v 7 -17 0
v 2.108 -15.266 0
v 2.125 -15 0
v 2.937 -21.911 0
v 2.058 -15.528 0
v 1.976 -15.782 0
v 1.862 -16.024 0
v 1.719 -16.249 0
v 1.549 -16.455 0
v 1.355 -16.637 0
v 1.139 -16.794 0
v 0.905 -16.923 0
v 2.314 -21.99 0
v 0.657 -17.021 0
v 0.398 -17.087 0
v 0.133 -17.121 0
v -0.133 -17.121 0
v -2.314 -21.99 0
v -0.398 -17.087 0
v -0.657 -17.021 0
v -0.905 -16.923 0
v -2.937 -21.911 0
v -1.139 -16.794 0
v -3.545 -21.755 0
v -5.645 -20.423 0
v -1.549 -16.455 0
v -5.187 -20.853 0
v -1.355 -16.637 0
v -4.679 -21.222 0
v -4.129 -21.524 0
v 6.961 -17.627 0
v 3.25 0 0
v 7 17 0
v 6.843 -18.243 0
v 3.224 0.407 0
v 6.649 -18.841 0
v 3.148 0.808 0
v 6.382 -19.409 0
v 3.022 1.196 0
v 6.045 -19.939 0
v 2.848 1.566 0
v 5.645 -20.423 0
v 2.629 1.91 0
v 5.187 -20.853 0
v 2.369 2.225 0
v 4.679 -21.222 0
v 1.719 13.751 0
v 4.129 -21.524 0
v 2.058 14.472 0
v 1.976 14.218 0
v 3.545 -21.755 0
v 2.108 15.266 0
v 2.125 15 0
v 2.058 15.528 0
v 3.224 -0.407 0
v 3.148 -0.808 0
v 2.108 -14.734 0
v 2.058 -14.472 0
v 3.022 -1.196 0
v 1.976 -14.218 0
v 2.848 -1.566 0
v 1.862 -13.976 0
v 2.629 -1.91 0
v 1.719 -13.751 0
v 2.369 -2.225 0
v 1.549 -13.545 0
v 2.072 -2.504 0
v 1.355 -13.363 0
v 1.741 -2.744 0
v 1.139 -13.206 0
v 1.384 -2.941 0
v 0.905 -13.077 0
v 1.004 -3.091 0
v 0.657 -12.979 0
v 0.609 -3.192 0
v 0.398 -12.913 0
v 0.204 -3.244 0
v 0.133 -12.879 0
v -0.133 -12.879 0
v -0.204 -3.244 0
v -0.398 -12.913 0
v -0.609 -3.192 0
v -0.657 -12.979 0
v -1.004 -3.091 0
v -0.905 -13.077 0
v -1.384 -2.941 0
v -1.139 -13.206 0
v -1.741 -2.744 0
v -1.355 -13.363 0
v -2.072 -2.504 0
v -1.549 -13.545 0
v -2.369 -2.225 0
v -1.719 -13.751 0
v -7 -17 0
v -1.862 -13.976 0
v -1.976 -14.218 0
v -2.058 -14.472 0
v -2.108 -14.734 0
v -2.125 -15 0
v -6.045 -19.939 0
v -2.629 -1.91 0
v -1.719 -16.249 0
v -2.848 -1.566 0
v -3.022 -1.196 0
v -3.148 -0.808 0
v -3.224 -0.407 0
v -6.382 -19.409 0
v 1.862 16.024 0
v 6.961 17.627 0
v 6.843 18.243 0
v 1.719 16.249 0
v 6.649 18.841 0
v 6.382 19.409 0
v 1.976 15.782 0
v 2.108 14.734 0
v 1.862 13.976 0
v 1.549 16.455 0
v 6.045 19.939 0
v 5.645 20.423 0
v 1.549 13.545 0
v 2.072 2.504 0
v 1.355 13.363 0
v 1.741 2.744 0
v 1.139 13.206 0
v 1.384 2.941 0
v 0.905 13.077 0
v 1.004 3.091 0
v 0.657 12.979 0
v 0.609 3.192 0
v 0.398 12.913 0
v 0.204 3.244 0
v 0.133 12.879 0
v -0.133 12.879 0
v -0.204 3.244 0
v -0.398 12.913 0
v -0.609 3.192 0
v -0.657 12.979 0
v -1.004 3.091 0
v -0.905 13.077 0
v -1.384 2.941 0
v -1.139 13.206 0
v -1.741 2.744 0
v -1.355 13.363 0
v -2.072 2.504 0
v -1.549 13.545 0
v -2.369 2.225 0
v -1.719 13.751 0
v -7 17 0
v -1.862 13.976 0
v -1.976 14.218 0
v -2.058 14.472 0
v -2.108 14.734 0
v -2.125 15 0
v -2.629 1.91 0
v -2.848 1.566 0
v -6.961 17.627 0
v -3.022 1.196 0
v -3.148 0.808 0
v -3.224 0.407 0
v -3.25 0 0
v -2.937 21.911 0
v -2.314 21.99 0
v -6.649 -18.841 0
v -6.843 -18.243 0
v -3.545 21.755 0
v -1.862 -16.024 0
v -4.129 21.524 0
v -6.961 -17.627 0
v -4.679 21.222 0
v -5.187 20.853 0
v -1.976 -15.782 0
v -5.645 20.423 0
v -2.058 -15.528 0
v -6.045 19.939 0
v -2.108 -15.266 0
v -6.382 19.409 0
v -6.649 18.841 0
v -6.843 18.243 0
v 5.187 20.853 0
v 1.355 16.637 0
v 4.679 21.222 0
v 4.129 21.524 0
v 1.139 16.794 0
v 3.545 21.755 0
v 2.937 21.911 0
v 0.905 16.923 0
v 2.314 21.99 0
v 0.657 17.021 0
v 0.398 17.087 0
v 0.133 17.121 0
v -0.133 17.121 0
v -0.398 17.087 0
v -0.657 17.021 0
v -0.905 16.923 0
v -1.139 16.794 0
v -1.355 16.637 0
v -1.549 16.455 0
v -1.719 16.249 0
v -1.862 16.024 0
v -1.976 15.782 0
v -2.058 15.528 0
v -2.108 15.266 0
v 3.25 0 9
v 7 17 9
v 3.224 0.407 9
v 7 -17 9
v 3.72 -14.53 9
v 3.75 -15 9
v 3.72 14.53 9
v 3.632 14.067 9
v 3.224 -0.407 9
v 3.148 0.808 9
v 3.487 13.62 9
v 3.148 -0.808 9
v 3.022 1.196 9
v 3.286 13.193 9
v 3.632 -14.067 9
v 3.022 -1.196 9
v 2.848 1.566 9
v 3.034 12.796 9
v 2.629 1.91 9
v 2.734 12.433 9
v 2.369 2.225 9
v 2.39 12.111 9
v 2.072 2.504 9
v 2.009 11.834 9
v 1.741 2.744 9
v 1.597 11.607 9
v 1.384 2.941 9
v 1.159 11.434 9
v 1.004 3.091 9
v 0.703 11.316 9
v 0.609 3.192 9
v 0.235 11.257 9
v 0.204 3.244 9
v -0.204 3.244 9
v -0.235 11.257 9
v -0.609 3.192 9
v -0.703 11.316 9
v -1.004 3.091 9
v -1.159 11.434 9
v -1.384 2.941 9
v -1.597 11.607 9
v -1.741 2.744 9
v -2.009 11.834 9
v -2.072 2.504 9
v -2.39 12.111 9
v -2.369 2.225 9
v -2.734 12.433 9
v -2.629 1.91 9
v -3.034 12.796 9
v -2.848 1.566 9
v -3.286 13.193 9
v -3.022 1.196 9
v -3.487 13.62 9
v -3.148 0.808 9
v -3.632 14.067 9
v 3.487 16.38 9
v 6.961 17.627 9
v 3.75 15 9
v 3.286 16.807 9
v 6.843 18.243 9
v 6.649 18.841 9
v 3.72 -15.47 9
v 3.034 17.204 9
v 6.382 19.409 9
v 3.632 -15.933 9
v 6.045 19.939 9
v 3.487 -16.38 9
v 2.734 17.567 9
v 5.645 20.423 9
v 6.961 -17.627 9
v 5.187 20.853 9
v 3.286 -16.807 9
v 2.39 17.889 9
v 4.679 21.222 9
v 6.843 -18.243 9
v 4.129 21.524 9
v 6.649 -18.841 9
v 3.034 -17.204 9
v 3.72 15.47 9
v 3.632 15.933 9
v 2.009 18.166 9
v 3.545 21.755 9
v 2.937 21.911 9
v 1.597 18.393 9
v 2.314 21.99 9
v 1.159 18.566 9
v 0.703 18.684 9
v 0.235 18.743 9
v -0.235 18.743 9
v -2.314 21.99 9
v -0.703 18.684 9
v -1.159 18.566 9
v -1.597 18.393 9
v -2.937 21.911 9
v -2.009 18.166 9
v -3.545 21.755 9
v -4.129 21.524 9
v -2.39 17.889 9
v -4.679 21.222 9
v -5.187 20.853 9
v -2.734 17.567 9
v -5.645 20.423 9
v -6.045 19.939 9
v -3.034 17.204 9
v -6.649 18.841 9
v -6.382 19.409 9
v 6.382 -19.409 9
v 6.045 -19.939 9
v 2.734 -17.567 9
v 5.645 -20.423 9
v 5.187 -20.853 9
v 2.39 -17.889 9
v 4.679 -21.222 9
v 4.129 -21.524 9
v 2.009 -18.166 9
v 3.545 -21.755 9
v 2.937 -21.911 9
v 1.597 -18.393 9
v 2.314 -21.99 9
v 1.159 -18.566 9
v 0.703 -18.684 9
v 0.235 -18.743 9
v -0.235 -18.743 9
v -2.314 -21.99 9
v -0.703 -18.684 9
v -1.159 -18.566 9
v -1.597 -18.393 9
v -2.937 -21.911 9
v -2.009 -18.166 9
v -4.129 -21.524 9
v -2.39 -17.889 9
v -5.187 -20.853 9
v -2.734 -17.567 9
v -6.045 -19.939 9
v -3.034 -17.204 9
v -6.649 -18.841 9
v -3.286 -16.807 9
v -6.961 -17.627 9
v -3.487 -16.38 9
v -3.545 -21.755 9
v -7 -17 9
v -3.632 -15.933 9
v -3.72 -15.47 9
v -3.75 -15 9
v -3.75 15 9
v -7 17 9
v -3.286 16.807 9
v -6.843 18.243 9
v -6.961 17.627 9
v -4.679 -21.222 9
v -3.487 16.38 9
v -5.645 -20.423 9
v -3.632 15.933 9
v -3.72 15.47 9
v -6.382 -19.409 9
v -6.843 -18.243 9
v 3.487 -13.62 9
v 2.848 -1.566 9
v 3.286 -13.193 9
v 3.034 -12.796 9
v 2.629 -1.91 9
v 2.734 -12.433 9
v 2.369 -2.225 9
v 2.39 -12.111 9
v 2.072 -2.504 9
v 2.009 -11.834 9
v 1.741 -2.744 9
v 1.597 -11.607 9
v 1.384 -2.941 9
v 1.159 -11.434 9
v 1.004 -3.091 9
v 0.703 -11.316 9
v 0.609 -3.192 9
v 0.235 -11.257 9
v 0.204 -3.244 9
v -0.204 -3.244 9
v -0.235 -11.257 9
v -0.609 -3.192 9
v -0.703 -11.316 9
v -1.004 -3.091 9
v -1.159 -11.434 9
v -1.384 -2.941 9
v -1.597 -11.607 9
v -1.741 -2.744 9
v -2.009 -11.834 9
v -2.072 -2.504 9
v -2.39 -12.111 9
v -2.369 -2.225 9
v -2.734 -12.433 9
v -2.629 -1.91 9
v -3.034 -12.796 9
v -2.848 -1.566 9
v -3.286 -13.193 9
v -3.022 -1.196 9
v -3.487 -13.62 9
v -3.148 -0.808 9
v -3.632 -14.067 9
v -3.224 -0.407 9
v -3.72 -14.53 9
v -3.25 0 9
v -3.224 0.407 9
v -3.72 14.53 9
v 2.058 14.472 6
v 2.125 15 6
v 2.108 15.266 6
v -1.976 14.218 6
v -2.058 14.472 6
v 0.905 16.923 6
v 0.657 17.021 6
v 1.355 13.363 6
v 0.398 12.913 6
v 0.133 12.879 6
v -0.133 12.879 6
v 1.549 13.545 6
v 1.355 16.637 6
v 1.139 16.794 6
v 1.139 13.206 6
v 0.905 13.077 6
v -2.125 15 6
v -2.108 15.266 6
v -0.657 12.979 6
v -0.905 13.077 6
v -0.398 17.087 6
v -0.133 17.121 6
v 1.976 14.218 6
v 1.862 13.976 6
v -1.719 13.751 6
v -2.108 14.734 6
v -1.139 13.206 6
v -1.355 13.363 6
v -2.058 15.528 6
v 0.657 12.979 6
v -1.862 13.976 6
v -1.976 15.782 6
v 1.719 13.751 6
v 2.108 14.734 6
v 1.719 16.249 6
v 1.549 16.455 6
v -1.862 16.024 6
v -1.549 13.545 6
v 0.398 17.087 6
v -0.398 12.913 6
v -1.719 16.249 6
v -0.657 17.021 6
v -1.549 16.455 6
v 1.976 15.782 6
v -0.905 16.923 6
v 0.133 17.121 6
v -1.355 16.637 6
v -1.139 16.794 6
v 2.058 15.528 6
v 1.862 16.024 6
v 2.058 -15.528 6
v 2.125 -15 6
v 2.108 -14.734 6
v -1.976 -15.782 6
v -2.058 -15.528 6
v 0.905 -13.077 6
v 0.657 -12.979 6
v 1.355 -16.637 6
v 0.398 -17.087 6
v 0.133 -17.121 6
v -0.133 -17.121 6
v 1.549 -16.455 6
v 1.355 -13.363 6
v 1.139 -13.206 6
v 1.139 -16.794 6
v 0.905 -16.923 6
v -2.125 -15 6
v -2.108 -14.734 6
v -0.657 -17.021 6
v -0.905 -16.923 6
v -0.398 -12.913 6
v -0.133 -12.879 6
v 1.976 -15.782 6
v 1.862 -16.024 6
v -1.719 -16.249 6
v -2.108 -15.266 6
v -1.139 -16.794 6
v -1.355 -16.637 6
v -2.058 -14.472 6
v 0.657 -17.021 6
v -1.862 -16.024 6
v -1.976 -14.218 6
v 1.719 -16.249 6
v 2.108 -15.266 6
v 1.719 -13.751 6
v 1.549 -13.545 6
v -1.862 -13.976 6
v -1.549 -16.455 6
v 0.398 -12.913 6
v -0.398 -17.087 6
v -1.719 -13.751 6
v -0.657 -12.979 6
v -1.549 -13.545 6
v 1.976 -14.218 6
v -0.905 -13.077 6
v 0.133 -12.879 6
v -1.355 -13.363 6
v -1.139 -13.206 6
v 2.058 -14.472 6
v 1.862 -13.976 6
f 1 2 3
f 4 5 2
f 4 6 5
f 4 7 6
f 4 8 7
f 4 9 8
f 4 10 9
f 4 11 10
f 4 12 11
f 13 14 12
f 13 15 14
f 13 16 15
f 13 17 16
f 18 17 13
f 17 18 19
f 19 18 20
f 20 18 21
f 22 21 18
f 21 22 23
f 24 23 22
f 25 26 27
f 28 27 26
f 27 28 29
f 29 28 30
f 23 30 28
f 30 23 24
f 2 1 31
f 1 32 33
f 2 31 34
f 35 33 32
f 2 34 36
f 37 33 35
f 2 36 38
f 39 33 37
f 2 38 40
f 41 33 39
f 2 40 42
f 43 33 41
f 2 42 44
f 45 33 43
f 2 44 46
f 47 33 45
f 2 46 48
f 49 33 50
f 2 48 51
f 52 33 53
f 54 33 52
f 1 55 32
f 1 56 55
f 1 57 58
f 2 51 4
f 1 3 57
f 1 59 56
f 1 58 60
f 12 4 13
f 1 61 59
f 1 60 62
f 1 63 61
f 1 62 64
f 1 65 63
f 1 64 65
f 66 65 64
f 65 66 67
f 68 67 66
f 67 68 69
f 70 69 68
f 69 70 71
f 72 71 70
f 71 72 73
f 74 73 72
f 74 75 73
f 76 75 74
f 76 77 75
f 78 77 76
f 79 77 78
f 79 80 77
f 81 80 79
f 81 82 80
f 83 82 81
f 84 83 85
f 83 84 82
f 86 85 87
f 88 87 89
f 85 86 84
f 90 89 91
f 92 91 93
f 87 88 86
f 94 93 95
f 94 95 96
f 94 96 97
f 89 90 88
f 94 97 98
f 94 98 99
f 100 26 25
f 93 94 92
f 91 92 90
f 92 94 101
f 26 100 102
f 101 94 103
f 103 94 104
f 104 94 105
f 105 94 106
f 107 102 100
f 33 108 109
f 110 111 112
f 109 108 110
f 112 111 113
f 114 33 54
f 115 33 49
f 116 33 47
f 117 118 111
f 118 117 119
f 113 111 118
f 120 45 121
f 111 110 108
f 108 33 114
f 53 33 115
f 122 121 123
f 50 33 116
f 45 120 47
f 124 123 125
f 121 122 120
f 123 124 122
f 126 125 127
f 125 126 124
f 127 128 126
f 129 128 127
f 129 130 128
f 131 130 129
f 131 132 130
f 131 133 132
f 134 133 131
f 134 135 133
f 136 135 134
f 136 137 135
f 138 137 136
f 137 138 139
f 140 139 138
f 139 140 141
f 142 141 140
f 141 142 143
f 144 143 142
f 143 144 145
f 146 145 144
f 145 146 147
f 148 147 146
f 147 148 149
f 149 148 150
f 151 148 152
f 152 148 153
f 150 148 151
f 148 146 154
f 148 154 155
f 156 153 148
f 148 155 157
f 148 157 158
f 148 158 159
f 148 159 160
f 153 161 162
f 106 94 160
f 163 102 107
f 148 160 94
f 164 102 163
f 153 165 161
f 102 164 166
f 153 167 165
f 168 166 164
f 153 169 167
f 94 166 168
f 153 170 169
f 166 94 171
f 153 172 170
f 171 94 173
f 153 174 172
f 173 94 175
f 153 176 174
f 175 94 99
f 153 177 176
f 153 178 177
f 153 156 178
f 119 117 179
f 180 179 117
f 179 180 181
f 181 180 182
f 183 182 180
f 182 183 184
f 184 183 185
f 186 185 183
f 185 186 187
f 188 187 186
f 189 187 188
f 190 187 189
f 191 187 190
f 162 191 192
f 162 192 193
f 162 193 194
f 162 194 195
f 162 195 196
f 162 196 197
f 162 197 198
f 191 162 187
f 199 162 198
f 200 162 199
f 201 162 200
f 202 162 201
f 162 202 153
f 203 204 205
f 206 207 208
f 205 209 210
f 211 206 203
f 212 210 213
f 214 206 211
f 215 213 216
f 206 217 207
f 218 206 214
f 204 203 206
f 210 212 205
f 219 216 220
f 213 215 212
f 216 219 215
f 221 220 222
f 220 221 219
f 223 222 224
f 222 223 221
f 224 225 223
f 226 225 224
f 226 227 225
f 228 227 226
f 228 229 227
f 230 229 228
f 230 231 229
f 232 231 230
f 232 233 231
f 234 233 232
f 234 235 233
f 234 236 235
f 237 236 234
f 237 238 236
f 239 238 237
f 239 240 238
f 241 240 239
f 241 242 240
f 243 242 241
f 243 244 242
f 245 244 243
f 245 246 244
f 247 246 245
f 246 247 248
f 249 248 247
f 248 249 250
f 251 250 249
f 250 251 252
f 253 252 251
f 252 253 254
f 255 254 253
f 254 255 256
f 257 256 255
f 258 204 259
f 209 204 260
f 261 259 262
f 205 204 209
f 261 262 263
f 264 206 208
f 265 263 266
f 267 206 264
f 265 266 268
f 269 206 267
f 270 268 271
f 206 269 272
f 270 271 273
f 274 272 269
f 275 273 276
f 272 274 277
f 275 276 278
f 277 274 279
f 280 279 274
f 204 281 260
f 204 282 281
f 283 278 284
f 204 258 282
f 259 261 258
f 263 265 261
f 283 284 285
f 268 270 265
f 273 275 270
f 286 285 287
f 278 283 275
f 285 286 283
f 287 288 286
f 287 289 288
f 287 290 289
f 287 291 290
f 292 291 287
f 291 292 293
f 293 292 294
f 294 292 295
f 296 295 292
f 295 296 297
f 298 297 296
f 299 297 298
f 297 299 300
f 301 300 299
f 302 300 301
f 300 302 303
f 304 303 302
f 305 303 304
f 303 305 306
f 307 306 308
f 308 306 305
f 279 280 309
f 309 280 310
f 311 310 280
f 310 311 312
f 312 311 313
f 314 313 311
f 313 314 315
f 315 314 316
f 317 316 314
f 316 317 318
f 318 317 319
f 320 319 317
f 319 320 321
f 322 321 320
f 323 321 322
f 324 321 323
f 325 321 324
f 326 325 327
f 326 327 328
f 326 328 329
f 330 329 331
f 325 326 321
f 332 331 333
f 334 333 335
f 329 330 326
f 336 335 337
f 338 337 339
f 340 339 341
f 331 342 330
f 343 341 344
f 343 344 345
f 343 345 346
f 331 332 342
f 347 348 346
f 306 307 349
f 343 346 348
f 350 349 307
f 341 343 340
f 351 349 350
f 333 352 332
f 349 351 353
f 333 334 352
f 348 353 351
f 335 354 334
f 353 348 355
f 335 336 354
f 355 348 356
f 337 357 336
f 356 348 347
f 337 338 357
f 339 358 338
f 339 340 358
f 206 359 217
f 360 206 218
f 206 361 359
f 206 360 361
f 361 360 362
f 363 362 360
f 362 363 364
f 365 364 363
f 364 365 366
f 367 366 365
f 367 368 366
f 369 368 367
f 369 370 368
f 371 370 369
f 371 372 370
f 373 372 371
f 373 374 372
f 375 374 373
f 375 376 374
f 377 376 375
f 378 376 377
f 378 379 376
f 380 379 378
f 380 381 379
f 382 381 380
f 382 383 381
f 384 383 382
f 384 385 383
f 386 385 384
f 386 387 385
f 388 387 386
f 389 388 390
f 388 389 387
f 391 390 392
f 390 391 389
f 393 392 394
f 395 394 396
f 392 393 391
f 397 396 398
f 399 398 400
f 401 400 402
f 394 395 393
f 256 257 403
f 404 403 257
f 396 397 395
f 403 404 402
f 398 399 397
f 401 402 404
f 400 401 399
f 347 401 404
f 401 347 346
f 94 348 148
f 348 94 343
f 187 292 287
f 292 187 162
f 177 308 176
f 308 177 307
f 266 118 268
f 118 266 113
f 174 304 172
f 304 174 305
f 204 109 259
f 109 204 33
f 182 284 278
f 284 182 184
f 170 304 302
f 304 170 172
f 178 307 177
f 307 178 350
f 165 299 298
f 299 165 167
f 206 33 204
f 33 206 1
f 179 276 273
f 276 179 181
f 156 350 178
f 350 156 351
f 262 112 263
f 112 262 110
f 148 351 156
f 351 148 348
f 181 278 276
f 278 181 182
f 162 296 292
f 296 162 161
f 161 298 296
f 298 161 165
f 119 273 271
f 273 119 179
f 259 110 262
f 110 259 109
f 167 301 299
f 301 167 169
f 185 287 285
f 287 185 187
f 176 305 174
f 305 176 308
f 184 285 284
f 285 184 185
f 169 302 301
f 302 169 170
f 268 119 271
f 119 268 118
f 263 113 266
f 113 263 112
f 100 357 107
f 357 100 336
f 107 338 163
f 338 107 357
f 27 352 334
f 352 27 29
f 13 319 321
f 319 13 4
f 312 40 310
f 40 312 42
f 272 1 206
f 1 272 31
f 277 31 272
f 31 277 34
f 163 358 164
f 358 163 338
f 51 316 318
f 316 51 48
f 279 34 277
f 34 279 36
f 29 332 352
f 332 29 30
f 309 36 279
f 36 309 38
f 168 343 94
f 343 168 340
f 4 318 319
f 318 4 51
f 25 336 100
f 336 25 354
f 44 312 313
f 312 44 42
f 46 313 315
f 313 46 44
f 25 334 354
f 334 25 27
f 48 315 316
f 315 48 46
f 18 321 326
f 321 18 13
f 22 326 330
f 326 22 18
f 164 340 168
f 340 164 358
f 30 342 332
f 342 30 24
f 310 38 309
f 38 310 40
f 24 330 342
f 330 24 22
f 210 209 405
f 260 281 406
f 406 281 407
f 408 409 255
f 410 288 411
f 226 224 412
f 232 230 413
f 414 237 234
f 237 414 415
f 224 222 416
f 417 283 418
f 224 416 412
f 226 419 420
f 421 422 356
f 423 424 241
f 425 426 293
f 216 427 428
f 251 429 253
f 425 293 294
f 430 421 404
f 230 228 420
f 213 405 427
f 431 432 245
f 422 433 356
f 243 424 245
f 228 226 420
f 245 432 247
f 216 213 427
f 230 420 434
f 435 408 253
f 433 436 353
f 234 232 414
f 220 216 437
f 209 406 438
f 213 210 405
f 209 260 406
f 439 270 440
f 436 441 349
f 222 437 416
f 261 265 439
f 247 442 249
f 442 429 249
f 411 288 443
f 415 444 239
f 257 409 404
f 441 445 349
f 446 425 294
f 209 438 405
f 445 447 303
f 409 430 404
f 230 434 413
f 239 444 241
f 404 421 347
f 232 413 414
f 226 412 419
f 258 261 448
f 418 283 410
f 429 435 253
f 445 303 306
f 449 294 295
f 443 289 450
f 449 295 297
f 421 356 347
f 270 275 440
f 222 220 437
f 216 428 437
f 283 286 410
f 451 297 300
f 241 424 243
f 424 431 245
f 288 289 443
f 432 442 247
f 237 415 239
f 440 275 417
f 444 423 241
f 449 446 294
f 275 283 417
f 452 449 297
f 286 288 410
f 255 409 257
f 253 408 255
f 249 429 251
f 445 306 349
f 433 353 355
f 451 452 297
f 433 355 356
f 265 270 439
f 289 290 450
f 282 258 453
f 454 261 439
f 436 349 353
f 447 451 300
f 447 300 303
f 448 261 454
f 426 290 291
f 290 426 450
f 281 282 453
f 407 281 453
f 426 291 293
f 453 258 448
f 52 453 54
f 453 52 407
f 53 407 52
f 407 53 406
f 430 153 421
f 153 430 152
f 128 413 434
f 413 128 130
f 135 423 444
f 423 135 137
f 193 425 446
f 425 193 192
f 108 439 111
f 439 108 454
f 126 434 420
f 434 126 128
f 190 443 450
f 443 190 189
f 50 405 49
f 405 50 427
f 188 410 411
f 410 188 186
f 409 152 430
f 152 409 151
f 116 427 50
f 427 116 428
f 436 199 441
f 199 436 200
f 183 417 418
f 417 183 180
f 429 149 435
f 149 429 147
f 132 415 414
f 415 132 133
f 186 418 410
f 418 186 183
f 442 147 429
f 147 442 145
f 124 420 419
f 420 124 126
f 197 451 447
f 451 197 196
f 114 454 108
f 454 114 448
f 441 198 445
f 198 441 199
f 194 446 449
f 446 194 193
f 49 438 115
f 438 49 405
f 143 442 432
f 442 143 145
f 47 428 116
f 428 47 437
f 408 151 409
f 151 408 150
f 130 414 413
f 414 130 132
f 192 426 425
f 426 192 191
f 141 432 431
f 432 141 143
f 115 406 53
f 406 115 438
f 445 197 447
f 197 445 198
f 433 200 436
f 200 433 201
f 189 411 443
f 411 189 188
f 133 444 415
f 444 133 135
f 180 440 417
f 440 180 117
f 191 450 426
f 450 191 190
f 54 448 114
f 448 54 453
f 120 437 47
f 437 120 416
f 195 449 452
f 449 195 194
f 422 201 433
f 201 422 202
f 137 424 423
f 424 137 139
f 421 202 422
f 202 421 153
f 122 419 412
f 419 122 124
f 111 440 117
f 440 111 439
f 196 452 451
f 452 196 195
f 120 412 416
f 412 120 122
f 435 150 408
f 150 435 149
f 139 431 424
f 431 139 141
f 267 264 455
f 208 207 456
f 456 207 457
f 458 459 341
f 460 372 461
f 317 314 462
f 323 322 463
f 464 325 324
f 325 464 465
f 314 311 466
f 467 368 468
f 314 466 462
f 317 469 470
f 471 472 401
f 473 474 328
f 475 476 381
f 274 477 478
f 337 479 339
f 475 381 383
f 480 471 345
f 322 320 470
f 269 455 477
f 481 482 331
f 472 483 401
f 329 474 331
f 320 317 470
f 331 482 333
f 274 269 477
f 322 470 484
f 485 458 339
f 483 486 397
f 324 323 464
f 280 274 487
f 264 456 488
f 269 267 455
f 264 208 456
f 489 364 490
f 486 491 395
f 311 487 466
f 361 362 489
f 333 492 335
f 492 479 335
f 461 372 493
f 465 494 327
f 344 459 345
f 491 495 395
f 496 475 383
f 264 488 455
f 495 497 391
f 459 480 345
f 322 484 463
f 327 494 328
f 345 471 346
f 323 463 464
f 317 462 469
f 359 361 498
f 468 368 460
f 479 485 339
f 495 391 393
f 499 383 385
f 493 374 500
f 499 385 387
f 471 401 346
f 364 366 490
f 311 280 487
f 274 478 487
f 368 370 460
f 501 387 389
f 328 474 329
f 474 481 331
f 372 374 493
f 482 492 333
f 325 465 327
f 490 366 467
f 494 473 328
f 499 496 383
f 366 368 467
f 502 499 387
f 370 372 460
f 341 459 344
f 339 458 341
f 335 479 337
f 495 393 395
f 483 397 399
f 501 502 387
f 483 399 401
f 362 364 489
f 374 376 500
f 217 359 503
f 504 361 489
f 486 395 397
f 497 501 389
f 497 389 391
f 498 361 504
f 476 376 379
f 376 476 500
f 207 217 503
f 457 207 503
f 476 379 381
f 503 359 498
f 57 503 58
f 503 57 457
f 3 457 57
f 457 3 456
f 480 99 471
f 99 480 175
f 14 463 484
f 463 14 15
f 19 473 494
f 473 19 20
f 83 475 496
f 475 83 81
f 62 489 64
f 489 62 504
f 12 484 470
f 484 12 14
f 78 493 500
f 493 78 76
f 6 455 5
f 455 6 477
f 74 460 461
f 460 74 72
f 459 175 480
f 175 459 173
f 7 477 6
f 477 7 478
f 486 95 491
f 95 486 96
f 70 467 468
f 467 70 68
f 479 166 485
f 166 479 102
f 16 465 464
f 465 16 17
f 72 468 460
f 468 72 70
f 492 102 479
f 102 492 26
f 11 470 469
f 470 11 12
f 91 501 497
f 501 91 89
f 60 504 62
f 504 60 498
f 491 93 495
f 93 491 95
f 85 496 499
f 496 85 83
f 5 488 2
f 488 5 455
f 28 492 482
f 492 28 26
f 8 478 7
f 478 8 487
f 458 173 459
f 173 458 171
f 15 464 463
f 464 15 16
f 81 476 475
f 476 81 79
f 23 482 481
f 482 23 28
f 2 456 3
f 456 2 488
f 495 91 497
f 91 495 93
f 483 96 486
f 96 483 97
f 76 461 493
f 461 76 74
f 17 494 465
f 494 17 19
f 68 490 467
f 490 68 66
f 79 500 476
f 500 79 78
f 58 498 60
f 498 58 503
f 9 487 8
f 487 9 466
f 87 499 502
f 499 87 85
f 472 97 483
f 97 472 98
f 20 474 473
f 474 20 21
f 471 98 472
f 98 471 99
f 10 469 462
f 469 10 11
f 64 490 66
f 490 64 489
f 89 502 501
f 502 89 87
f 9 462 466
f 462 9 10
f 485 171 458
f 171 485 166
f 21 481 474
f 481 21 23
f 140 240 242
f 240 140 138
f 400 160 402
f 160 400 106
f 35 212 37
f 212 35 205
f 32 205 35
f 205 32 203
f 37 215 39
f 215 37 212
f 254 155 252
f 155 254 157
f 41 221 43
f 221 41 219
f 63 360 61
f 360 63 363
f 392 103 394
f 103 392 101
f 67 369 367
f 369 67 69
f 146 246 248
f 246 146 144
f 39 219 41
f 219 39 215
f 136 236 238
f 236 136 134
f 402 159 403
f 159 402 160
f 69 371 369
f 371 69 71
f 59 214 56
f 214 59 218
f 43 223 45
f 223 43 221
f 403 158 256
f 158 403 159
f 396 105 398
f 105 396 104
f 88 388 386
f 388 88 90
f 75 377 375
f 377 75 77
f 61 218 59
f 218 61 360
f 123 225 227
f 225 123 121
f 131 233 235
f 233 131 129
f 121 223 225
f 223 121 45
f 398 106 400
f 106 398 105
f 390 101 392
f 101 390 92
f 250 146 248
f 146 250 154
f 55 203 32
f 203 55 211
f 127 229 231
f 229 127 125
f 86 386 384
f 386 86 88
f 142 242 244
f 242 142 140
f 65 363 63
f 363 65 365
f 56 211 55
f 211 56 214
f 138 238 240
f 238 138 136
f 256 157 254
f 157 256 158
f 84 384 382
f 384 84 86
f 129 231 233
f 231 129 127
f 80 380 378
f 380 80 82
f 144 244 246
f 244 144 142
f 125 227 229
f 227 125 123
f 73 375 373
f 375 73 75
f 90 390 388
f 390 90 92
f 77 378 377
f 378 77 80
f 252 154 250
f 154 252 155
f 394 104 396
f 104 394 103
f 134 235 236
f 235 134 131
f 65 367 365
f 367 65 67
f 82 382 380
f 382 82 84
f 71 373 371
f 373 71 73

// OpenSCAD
$fn = 50;


difference() {
	union() {
		cylinder(h = 9, r = 7.0000000000);
		translate(v = [0.0000000000, 7.5000000000, 0]) {
			hull() {
				translate(v = [-2.0000000000, 9.5000000000, 0]) {
					cylinder(h = 9, r = 5);
				}
				translate(v = [2.0000000000, 9.5000000000, 0]) {
					cylinder(h = 9, r = 5);
				}
				translate(v = [-2.0000000000, -9.5000000000, 0]) {
					cylinder(h = 9, r = 5);
				}
				translate(v = [2.0000000000, -9.5000000000, 0]) {
					cylinder(h = 9, r = 5);
				}
			}
		}
		translate(v = [0.0000000000, 7.5000000000, 0]) {
			hull() {
				translate(v = [-2.0000000000, 9.5000000000, 0]) {
					cylinder(h = 9, r = 5);
				}
				translate(v = [2.0000000000, 9.5000000000, 0]) {
					cylinder(h = 9, r = 5);
				}
				translate(v = [-2.0000000000, -9.5000000000, 0]) {
					cylinder(h = 9, r = 5);
				}
				translate(v = [2.0000000000, -9.5000000000, 0]) {
					cylinder(h = 9, r = 5);
				}
			}
		}
		translate(v = [0.0000000000, -7.5000000000, 0]) {
			hull() {
				translate(v = [-2.0000000000, 9.5000000000, 0]) {
					cylinder(h = 9, r = 5);
				}
				translate(v = [2.0000000000, 9.5000000000, 0]) {
					cylinder(h = 9, r = 5);
				}
				translate(v = [-2.0000000000, -9.5000000000, 0]) {
					cylinder(h = 9, r = 5);
				}
				translate(v = [2.0000000000, -9.5000000000, 0]) {
					cylinder(h = 9, r = 5);
				}
			}
		}
		translate(v = [0.0000000000, -7.5000000000, 0]) {
			hull() {
				translate(v = [-2.0000000000, 9.5000000000, 0]) {
					cylinder(h = 9, r = 5);
				}
				translate(v = [2.0000000000, 9.5000000000, 0]) {
					cylinder(h = 9, r = 5);
				}
				translate(v = [-2.0000000000, -9.5000000000, 0]) {
					cylinder(h = 9, r = 5);
				}
				translate(v = [2.0000000000, -9.5000000000, 0]) {
					cylinder(h = 9, r = 5);
				}
			}
		}
	}
	union() {
		translate(v = [0.0000000000, 15.0000000000, 9]) {
			rotate(a = [0, 0, 0]) {
				difference() {
					union() {
						#translate(v = [0, 0, -9.0000000000]) {
							cylinder(h = 9, r = 2.0000000000);
						}
						#translate(v = [0, 0, -3]) {
							cylinder(h = 3, r1 = 2.1250000000, r2 = 3.7500000000);
						}
						#translate(v = [0, 0, -9.0000000000]) {
							cylinder(h = 9, r = 2.1250000000);
						}
						#translate(v = [0, 0, -9.0000000000]) {
							cylinder(h = 9, r = 2.0000000000);
						}
					}
					union();
				}
			}
		}
		translate(v = [0.0000000000, 15.0000000000, 9]) {
			rotate(a = [0, 0, 0]) {
				difference() {
					union() {
						#translate(v = [0, 0, -9.0000000000]) {
							cylinder(h = 9, r = 2.0000000000);
						}
						#translate(v = [0, 0, -3]) {
							cylinder(h = 3, r1 = 2.1250000000, r2 = 3.7500000000);
						}
						#translate(v = [0, 0, -9.0000000000]) {
							cylinder(h = 9, r = 2.1250000000);
						}
						#translate(v = [0, 0, -9.0000000000]) {
							cylinder(h = 9, r = 2.0000000000);
						}
					}
					union();
				}
			}
		}
		translate(v = [0.0000000000, -15.0000000000, 9]) {
			rotate(a = [0, 0, 0]) {
				difference() {
					union() {
						#translate(v = [0, 0, -9.0000000000]) {
							cylinder(h = 9, r = 2.0000000000);
						}
						#translate(v = [0, 0, -3]) {
							cylinder(h = 3, r1 = 2.1250000000, r2 = 3.7500000000);
						}
						#translate(v = [0, 0, -9.0000000000]) {
							cylinder(h = 9, r = 2.1250000000);
						}
						#translate(v = [0, 0, -9.0000000000]) {
							cylinder(h = 9, r = 2.0000000000);
						}
					}
					union();
				}
			}
		}
		translate(v = [0.0000000000, -15.0000000000, 9]) {
			rotate(a = [0, 0, 0]) {
				difference() {
					union() {
						#translate(v = [0, 0, -9.0000000000]) {
							cylinder(h = 9, r = 2.0000000000);
						}
						#translate(v = [0, 0, -3]) {
							cylinder(h = 3, r1 = 2.1250000000, r2 = 3.7500000000);
						}
						#translate(v = [0, 0, -9.0000000000]) {
							cylinder(h = 9, r = 2.1250000000);
						}
						#translate(v = [0, 0, -9.0000000000]) {
							cylinder(h = 9, r = 2.0000000000);
						}
					}
					union();
				}
			}
		}
		translate(v = [0, 0, -100]) {
			cylinder(h = 200, r = 3.2500000000);
		}
		translate(v = [0, 0, -100]) {
			cylinder(h = 200, r = 1.8000000000);
		}
	}
}
